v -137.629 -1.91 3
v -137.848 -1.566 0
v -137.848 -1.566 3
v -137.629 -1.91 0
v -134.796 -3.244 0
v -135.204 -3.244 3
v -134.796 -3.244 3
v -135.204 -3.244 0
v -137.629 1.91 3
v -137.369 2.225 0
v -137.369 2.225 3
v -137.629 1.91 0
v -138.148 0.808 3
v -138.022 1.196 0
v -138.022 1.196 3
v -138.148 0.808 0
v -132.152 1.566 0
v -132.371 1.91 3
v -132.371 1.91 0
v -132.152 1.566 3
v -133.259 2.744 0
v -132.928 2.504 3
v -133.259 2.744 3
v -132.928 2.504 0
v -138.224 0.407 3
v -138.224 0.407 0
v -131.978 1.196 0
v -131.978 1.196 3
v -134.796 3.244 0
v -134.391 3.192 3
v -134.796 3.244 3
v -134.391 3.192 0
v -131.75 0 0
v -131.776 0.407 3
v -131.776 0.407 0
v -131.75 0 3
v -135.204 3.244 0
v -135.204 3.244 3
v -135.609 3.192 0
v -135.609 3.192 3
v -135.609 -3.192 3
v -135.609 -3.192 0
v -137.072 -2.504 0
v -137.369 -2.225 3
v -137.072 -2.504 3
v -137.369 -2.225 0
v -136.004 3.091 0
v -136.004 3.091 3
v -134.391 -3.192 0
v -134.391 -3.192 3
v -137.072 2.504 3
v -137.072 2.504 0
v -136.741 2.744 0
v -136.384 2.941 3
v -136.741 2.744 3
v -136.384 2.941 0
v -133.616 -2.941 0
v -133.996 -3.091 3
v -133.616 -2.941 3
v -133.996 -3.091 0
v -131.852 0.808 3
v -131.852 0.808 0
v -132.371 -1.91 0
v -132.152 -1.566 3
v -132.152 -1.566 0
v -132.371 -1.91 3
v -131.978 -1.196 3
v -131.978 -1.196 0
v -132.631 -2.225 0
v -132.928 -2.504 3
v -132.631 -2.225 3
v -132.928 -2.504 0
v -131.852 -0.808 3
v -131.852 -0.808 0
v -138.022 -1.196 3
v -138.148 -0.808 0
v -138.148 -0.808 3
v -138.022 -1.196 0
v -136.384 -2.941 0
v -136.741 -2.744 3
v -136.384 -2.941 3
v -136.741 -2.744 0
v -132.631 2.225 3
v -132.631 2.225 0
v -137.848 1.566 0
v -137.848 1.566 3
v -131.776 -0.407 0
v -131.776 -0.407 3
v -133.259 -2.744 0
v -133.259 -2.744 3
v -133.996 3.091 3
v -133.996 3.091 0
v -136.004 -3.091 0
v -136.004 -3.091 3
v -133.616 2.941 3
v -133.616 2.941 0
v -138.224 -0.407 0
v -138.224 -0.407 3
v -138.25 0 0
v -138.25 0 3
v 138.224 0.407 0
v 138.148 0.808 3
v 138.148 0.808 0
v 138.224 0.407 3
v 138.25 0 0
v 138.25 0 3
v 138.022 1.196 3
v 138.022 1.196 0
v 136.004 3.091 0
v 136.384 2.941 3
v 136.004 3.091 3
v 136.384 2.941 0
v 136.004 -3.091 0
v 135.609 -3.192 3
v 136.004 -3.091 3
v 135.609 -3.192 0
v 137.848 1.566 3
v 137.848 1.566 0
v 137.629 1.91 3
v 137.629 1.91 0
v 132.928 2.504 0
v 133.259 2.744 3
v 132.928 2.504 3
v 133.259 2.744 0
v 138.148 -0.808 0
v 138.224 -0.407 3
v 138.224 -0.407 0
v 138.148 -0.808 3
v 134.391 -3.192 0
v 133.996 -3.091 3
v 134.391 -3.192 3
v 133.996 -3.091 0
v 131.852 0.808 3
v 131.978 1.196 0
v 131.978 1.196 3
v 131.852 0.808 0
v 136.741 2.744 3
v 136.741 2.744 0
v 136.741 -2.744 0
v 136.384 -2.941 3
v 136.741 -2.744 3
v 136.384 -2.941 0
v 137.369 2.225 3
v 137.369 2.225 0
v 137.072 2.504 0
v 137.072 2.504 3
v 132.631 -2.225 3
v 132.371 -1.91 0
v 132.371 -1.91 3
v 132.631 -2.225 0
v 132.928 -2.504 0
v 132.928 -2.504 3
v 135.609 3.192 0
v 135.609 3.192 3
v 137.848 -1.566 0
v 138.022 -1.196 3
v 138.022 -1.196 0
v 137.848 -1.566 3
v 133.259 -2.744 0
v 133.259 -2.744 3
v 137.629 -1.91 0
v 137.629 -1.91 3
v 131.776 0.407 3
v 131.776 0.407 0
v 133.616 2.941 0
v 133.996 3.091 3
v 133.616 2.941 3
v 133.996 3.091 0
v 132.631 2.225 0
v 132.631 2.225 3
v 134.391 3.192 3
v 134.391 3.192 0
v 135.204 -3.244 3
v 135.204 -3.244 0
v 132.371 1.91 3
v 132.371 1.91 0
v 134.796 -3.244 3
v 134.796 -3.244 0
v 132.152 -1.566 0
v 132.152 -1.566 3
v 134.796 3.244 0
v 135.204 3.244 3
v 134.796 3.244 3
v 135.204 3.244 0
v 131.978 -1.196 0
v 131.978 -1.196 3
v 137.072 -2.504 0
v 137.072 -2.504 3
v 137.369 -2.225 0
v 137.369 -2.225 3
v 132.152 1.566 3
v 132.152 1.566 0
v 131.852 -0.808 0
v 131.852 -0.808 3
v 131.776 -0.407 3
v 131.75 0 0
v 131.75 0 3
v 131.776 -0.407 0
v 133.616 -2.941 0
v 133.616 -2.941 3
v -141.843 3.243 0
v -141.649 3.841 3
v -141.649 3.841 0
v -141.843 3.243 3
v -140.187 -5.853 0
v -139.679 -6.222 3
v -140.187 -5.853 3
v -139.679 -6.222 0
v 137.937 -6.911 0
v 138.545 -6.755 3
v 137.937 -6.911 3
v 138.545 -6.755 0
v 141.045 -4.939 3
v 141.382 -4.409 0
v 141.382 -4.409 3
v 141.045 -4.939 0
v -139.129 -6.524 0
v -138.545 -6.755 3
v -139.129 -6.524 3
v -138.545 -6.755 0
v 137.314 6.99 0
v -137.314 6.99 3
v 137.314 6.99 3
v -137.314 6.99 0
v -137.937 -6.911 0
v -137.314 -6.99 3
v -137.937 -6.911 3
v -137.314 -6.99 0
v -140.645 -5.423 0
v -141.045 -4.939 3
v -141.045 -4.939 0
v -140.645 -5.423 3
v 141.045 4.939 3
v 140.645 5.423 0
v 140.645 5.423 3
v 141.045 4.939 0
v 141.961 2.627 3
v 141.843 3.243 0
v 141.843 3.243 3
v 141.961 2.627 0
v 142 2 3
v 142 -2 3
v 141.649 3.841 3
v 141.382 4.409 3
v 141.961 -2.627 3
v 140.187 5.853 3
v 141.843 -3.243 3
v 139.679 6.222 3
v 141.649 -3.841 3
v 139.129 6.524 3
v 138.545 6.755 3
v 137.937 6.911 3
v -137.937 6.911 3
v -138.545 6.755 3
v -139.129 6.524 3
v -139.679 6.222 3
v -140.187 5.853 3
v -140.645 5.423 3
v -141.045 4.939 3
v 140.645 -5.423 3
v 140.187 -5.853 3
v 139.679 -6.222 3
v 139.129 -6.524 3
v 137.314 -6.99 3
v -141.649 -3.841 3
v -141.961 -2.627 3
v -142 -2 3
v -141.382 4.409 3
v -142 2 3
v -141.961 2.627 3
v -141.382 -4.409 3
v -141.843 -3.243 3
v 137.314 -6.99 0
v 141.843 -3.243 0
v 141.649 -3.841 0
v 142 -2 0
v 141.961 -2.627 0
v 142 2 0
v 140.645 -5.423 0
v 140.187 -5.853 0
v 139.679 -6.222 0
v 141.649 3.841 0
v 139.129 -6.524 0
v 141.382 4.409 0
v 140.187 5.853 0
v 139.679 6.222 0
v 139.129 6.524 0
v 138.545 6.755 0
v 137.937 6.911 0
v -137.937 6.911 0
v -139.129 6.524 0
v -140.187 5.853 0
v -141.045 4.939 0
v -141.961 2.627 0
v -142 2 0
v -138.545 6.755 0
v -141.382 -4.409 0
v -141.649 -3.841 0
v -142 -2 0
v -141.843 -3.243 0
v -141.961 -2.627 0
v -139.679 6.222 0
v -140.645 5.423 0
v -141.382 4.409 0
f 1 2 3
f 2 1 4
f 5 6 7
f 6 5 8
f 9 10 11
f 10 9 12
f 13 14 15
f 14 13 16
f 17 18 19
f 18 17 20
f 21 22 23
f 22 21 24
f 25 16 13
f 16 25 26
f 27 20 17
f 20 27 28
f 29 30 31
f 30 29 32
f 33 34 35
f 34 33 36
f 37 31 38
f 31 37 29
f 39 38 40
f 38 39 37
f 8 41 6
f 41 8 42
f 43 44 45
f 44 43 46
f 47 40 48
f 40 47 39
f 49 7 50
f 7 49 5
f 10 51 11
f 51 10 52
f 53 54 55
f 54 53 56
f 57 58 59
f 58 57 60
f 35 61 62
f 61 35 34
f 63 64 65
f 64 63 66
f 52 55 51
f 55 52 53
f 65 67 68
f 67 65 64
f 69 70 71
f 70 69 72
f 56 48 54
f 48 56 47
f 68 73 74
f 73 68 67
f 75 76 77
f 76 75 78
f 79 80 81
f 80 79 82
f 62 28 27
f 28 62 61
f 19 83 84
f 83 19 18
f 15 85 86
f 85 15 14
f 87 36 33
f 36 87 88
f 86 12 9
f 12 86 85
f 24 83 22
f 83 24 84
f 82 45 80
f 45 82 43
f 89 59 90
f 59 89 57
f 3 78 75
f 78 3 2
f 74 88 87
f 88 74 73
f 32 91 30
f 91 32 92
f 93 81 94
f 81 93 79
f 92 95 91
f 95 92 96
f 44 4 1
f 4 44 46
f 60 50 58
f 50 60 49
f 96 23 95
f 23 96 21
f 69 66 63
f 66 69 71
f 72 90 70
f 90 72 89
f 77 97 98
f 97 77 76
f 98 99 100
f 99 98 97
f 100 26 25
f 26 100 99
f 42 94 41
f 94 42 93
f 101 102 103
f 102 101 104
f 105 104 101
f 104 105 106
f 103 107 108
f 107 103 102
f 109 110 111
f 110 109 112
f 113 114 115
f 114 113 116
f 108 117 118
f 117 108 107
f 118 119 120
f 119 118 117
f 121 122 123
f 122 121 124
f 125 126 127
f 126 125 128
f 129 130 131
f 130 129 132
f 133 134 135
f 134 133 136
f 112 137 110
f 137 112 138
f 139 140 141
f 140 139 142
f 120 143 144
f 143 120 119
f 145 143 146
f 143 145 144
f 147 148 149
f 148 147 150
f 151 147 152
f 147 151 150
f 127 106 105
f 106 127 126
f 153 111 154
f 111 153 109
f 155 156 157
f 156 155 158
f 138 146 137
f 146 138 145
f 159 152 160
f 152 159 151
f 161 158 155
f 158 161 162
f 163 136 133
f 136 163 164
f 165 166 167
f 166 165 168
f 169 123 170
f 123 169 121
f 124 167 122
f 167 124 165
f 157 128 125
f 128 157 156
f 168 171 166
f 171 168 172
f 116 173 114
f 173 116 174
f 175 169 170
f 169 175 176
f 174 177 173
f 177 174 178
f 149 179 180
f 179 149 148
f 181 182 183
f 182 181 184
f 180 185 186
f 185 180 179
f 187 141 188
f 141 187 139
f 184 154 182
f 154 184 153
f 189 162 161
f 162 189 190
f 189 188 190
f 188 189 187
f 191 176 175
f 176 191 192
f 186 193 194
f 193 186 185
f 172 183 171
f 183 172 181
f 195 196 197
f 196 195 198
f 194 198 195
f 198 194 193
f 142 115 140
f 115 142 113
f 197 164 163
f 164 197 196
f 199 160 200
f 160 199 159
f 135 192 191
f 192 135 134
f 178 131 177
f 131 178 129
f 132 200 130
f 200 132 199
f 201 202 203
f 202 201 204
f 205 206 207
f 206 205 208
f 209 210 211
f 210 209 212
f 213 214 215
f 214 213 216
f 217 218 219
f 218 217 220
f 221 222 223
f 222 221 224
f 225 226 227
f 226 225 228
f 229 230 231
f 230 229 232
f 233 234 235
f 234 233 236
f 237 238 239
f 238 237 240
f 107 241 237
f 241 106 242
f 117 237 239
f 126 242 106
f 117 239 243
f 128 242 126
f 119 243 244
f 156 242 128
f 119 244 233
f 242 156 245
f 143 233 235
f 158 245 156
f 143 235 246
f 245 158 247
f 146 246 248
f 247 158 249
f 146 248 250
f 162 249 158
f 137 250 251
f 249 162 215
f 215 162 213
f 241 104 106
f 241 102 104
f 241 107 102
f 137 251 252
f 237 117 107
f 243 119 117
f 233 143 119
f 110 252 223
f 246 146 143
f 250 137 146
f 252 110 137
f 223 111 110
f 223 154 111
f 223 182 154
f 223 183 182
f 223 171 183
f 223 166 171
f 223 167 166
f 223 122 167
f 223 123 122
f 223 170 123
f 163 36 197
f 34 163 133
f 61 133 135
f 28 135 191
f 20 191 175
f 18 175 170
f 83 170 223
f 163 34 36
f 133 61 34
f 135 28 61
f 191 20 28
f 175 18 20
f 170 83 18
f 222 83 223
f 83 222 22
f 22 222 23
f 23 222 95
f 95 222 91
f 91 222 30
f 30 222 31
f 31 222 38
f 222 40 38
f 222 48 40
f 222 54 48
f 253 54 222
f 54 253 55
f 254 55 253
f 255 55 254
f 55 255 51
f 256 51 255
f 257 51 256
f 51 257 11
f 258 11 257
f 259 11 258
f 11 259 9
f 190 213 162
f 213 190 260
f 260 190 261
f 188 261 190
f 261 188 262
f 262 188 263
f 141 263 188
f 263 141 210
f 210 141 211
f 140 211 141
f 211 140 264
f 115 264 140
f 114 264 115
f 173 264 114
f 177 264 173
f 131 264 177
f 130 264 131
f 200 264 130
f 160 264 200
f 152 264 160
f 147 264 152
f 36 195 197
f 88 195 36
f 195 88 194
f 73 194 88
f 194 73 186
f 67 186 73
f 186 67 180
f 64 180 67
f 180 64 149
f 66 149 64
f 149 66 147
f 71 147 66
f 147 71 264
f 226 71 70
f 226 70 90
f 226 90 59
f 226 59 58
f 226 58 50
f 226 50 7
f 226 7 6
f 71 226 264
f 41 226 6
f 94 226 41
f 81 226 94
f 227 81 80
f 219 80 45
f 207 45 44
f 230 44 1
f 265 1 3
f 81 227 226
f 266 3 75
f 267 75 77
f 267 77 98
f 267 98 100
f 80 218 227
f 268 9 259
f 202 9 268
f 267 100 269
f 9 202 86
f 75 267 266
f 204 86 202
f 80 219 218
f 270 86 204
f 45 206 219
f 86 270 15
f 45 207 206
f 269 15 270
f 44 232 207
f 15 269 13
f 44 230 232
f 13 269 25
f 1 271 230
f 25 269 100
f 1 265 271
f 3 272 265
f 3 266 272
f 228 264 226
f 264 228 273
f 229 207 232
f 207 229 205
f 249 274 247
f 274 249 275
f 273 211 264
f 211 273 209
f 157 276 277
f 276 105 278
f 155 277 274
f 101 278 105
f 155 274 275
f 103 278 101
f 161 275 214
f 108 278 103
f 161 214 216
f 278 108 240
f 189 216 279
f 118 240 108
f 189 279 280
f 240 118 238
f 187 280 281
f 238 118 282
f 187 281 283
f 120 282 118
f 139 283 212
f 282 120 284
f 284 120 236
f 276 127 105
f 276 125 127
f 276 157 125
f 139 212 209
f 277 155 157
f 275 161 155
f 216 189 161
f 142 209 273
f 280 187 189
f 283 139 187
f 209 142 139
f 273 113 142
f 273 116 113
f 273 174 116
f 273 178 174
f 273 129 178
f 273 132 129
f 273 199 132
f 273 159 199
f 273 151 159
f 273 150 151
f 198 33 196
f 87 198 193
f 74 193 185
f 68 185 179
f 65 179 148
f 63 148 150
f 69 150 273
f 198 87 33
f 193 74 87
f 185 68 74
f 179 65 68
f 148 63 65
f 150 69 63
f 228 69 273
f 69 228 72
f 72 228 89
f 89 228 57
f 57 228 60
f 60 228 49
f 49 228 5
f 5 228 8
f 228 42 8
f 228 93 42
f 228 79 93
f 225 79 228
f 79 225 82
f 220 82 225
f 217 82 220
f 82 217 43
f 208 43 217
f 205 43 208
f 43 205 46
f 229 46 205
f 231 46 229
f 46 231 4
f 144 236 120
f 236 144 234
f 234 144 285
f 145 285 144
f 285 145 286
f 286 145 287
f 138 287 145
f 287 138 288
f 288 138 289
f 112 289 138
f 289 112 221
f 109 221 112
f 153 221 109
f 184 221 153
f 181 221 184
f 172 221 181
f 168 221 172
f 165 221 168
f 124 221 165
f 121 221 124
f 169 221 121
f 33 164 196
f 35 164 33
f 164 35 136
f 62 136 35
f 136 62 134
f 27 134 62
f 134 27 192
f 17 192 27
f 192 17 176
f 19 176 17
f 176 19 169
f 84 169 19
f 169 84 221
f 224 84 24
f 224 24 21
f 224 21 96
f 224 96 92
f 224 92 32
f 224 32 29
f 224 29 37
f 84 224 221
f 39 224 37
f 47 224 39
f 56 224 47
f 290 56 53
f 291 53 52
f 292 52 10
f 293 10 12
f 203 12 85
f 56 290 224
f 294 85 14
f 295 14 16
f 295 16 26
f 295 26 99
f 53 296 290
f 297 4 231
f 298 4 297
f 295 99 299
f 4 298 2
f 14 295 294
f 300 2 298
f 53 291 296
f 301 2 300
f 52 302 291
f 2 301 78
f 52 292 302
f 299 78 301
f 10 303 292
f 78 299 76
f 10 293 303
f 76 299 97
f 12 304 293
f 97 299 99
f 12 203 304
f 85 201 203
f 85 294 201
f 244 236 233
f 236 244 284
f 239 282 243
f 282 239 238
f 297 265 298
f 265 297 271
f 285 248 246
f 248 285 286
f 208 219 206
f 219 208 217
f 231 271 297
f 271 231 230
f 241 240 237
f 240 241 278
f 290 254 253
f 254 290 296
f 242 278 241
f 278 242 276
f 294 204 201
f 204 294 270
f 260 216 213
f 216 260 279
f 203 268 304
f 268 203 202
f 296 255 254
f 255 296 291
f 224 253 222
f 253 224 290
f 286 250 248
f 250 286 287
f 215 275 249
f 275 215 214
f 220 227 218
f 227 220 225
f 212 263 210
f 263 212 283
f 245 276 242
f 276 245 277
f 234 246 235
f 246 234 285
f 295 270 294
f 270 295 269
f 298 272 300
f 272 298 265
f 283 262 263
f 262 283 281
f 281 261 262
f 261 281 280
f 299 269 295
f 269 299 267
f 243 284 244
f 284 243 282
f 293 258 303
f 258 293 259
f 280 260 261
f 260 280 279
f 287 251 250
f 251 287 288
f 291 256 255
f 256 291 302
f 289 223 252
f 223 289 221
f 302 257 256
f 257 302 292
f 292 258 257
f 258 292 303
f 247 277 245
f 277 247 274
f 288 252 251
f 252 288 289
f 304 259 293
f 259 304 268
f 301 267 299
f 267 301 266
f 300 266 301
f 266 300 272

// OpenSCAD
$fn = 50;


difference() {
	union() {
		hull() {
			translate(v = [-137.0000000000, 2.0000000000, 0]) {
				cylinder(h = 3, r = 5);
			}
			translate(v = [137.0000000000, 2.0000000000, 0]) {
				cylinder(h = 3, r = 5);
			}
			translate(v = [-137.0000000000, -2.0000000000, 0]) {
				cylinder(h = 3, r = 5);
			}
			translate(v = [137.0000000000, -2.0000000000, 0]) {
				cylinder(h = 3, r = 5);
			}
		}
	}
	union() {
		translate(v = [-135.0000000000, 0.0000000000, -100.0000000000]) {
			cylinder(h = 200, r = 3.2500000000);
		}
		translate(v = [-135.0000000000, 0.0000000000, -100.0000000000]) {
			cylinder(h = 200, r = 3.2500000000);
		}
		translate(v = [135.0000000000, 0.0000000000, -100.0000000000]) {
			cylinder(h = 200, r = 3.2500000000);
		}
		translate(v = [135.0000000000, 0.0000000000, -100.0000000000]) {
			cylinder(h = 200, r = 3.2500000000);
		}
	}
}
